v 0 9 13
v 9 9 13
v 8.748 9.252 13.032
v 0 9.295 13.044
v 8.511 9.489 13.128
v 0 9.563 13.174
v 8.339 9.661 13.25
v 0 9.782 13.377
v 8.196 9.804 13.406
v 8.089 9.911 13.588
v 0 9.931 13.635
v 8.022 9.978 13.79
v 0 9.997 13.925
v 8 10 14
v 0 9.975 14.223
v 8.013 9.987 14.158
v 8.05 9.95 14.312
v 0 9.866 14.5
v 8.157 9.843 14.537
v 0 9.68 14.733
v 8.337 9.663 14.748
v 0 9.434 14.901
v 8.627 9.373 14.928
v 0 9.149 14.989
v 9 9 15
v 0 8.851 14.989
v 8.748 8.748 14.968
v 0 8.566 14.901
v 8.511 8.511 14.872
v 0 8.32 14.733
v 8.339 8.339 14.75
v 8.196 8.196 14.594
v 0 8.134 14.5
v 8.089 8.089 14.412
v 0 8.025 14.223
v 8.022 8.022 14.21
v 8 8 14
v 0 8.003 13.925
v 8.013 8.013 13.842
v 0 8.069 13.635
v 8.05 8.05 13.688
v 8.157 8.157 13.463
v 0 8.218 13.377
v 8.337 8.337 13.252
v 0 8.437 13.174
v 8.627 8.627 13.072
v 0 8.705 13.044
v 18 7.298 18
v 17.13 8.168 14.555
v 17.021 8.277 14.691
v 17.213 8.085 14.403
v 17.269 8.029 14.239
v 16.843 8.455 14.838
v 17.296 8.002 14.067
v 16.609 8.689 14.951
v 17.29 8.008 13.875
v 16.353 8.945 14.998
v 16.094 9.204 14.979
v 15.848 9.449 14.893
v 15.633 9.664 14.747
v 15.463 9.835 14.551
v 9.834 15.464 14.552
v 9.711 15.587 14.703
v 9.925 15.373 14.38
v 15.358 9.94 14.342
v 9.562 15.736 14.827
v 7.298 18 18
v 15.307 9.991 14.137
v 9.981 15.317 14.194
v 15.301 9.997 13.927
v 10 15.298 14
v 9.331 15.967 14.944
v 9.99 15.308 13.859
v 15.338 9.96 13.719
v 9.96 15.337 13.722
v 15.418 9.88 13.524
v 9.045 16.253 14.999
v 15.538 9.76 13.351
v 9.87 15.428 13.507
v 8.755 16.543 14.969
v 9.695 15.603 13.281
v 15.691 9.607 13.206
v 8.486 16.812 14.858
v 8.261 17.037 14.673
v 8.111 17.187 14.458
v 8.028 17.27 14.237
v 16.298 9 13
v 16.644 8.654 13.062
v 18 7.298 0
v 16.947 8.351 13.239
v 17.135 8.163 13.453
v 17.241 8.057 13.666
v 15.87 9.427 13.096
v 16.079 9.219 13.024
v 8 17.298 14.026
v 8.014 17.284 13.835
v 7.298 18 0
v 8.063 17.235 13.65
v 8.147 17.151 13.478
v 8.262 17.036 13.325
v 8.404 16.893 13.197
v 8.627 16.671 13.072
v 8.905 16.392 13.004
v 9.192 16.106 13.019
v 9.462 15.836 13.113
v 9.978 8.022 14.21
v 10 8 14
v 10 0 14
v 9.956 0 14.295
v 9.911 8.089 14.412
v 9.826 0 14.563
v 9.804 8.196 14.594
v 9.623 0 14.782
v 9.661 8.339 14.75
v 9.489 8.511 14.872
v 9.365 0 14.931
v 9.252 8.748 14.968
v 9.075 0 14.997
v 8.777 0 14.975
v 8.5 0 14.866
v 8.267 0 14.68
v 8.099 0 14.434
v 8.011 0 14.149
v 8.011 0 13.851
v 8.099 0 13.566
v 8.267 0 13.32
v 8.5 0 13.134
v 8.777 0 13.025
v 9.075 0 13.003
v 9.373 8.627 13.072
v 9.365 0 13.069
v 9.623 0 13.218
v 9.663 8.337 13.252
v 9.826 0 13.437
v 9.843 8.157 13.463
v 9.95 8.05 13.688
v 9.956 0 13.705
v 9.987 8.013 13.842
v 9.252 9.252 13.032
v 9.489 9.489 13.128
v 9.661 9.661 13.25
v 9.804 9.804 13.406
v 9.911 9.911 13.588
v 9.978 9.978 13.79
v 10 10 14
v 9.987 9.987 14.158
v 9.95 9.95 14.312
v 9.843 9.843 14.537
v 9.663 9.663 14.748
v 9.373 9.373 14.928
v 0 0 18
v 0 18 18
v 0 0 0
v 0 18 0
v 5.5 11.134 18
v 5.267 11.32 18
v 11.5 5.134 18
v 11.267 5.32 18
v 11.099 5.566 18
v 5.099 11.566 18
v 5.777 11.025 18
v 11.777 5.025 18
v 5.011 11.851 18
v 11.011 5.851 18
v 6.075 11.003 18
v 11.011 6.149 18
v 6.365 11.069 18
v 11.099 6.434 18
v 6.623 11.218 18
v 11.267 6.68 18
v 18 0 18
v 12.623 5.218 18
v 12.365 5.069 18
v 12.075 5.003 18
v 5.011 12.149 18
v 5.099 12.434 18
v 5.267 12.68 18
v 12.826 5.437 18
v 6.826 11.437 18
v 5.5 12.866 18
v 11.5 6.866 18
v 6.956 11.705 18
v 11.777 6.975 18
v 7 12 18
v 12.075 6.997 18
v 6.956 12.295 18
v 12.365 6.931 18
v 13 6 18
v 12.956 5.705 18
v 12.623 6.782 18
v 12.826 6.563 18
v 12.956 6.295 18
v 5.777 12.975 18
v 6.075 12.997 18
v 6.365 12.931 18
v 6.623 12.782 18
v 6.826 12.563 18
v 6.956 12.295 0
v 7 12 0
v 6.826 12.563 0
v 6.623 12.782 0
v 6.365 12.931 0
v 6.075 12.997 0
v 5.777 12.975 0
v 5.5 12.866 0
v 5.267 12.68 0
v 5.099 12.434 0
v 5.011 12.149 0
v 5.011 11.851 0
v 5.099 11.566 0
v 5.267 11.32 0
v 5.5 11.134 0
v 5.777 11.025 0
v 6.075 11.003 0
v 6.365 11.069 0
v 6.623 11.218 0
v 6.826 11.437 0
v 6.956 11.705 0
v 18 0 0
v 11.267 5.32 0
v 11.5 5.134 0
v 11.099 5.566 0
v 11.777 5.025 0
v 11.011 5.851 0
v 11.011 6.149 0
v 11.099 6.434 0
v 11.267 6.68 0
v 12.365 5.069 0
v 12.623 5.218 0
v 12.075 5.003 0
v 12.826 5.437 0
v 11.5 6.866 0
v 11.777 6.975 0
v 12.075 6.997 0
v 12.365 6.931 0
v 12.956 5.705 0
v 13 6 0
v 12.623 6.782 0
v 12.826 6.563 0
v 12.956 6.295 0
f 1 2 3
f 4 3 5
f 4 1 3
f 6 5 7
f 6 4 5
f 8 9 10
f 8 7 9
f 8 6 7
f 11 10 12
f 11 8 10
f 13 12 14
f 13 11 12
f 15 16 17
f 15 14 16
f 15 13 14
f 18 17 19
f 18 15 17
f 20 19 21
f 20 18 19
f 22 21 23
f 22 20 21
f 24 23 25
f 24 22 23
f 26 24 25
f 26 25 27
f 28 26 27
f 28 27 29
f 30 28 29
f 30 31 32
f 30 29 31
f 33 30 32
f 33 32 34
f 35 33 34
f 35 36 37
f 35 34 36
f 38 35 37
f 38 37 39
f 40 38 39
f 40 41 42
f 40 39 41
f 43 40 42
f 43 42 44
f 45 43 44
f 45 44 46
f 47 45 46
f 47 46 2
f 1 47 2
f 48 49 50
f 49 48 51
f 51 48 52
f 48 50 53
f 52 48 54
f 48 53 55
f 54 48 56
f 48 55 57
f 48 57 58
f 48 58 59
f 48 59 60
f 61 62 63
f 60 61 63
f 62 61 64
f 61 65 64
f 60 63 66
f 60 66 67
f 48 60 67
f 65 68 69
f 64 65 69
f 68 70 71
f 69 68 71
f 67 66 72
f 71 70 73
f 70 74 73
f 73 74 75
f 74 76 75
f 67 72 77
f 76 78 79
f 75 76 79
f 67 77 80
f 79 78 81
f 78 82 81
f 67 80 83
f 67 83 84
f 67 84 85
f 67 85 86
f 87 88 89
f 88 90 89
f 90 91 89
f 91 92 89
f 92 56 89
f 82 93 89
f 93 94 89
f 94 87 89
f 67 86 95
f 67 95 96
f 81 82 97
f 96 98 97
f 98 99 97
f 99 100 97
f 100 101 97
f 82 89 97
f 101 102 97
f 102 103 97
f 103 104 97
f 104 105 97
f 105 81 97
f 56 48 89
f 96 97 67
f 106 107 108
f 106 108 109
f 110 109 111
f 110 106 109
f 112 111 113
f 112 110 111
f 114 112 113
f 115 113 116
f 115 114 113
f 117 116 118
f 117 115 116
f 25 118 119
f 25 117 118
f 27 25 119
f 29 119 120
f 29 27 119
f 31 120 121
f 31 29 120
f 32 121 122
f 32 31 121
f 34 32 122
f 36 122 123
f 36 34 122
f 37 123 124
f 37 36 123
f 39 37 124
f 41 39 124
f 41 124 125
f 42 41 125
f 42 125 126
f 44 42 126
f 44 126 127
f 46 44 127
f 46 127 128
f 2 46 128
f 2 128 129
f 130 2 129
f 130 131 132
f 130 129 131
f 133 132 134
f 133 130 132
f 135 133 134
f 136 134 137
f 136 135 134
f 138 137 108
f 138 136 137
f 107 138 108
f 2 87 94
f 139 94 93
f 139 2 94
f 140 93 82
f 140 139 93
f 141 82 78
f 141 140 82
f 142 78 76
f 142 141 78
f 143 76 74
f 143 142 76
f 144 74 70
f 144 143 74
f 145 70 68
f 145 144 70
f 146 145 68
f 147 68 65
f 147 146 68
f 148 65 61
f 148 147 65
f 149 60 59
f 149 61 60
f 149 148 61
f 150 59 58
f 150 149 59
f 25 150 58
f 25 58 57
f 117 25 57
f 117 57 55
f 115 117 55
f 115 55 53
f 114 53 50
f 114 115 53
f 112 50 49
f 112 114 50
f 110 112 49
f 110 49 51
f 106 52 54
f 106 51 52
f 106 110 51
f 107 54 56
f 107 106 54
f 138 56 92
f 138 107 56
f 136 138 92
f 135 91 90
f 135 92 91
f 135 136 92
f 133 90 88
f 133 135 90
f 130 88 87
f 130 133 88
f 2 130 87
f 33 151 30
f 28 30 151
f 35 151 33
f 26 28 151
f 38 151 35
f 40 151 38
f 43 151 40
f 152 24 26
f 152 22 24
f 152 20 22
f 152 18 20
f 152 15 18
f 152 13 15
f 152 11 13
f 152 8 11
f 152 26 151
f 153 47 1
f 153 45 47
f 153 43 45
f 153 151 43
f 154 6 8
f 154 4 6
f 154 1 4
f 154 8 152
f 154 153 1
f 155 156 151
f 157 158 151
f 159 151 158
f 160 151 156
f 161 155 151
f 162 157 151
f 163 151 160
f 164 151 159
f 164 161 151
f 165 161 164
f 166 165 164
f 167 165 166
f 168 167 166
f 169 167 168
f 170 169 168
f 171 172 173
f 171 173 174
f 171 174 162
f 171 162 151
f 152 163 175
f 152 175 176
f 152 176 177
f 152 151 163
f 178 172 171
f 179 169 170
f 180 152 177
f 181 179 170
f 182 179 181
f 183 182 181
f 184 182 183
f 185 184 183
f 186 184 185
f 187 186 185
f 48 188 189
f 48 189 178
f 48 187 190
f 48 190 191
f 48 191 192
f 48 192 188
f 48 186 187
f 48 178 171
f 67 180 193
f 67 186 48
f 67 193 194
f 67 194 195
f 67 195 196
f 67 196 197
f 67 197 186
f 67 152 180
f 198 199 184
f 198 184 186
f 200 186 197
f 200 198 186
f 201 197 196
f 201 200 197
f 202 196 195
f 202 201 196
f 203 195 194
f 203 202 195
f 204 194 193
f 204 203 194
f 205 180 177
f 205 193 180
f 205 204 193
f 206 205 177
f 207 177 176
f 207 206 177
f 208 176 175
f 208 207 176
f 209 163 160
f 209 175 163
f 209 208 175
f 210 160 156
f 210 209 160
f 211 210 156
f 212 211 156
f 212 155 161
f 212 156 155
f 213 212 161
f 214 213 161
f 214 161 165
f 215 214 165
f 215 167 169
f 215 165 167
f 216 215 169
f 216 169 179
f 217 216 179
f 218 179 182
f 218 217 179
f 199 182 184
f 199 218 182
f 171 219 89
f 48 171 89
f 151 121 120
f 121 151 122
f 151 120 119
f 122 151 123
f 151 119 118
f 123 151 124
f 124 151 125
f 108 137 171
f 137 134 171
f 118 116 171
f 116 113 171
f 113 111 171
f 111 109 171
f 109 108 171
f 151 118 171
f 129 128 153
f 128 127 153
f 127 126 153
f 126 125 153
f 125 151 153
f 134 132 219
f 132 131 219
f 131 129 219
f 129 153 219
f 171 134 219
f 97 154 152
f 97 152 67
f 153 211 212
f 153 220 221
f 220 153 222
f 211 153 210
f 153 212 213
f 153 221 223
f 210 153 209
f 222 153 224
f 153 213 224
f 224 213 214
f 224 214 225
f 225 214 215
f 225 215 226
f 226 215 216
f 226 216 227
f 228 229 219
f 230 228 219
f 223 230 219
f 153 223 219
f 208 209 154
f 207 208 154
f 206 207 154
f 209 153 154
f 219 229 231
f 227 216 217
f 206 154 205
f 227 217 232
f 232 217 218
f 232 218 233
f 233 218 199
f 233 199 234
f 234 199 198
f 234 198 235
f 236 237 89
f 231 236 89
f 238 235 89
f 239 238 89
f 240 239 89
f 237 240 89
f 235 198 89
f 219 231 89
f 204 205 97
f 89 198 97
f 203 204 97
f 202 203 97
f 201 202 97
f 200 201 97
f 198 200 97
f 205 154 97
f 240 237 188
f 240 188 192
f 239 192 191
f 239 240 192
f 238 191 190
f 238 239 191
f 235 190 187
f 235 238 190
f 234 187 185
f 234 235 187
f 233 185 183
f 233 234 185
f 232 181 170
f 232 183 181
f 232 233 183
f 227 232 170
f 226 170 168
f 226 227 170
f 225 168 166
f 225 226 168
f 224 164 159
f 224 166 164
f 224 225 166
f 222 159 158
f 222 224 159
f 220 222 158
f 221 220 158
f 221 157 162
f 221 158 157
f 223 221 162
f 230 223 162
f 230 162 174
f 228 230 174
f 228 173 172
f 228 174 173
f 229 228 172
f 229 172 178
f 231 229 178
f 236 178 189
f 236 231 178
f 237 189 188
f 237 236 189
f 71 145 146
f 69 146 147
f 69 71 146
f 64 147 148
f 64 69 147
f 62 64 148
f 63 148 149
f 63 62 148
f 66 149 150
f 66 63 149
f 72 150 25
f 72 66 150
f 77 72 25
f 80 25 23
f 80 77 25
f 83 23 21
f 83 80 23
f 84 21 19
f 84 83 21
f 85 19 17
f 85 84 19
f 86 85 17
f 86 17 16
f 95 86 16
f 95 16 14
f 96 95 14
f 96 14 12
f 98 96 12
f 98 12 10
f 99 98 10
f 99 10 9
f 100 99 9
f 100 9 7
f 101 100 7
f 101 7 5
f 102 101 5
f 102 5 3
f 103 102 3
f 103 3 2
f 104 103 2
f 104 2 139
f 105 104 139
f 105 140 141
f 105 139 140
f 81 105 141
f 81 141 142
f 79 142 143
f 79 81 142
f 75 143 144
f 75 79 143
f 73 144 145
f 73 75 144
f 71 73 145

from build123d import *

# Parameters (mm, degrees)
CYLINDER003_R          = 1
CYLINDER003_DEPTH      = 50
CYLINDER004_R          = 1
CYLINDER004_DEPTH      = 50
BOX002_W               = 18
BOX002_H               = 50
BOX002_DEPTH           = 18
BOX002_PLACEMENT_ANGLE = 45
CYLINDER002_R          = 1
CYLINDER002_DEPTH      = 50
ARRAY001_Y_COUNT       = 2
ARRAY001_Y_PITCH       = 8.485281
BOX001_W               = 18
BOX001_H               = 18
BOX001_DEPTH           = 18


with BuildPart() as cylinder003:
    # Cylinder003 → Cylinder003 (new body)
    with BuildSketch(Plane(origin=(-17, 9, 14), x_dir=(0, 0, -1), z_dir=(1, 0, 0))):
        Circle(CYLINDER003_R)
    extrude(amount=CYLINDER003_DEPTH)


with BuildPart() as cylinder004:
    # Cylinder004 → Cylinder004 (new body)
    with BuildSketch(Plane(origin=(9, 27, 14), x_dir=(1, 0, 0), z_dir=(0, -1, 0))):
        Circle(CYLINDER004_R)
    extrude(amount=CYLINDER004_DEPTH)


with BuildPart() as cube002:
    # Box002 → Box002 (new body)
    with BuildSketch(Plane.XY):
        with Locations((9, 25)):
            Rectangle(BOX002_W, BOX002_H)
    extrude(amount=BOX002_DEPTH)


with BuildPart() as cube002_1:
    # Box002 placement: moved
    add(cube002.part.moved(Location((28.8715, -3.57359, 0))).rotate(Axis((28.8715, -3.57359, 0), (0, 0, 1)), BOX002_PLACEMENT_ANGLE))


with BuildPart() as fusion001:
    # Cylinder002 → Cylinder002 (new body)
    with BuildSketch(Plane(origin=(6, 12, -10), x_dir=(1, 0, 0), z_dir=(0, 0, 1))):
        Circle(CYLINDER002_R)
    extrude(amount=CYLINDER002_DEPTH)

    # Array001 Y: Fusion001 ×2


with BuildPart() as fusion001_1:
    add(fusion001.part)
    with Locations(*[Vector(0.707107, -0.707107, 0) * (i * ARRAY001_Y_PITCH) for i in range(1, ARRAY001_Y_COUNT)]):
        add(fusion001.part)

    # Fusion001: union Cylinder003, Cylinder004, Cube002
    add(cylinder003.part)
    add(cylinder004.part)
    add(cube002_1.part)


with BuildPart() as cut001:
    # Box001 → Box001 (new body)
    with BuildSketch(Plane.XY):
        with Locations((9, 9)):
            Rectangle(BOX001_W, BOX001_H)
    extrude(amount=BOX001_DEPTH)

    # Cut001: cut Fusion001
    add(fusion001_1.part, mode=Mode.SUBTRACT)


solid = cut001.part
